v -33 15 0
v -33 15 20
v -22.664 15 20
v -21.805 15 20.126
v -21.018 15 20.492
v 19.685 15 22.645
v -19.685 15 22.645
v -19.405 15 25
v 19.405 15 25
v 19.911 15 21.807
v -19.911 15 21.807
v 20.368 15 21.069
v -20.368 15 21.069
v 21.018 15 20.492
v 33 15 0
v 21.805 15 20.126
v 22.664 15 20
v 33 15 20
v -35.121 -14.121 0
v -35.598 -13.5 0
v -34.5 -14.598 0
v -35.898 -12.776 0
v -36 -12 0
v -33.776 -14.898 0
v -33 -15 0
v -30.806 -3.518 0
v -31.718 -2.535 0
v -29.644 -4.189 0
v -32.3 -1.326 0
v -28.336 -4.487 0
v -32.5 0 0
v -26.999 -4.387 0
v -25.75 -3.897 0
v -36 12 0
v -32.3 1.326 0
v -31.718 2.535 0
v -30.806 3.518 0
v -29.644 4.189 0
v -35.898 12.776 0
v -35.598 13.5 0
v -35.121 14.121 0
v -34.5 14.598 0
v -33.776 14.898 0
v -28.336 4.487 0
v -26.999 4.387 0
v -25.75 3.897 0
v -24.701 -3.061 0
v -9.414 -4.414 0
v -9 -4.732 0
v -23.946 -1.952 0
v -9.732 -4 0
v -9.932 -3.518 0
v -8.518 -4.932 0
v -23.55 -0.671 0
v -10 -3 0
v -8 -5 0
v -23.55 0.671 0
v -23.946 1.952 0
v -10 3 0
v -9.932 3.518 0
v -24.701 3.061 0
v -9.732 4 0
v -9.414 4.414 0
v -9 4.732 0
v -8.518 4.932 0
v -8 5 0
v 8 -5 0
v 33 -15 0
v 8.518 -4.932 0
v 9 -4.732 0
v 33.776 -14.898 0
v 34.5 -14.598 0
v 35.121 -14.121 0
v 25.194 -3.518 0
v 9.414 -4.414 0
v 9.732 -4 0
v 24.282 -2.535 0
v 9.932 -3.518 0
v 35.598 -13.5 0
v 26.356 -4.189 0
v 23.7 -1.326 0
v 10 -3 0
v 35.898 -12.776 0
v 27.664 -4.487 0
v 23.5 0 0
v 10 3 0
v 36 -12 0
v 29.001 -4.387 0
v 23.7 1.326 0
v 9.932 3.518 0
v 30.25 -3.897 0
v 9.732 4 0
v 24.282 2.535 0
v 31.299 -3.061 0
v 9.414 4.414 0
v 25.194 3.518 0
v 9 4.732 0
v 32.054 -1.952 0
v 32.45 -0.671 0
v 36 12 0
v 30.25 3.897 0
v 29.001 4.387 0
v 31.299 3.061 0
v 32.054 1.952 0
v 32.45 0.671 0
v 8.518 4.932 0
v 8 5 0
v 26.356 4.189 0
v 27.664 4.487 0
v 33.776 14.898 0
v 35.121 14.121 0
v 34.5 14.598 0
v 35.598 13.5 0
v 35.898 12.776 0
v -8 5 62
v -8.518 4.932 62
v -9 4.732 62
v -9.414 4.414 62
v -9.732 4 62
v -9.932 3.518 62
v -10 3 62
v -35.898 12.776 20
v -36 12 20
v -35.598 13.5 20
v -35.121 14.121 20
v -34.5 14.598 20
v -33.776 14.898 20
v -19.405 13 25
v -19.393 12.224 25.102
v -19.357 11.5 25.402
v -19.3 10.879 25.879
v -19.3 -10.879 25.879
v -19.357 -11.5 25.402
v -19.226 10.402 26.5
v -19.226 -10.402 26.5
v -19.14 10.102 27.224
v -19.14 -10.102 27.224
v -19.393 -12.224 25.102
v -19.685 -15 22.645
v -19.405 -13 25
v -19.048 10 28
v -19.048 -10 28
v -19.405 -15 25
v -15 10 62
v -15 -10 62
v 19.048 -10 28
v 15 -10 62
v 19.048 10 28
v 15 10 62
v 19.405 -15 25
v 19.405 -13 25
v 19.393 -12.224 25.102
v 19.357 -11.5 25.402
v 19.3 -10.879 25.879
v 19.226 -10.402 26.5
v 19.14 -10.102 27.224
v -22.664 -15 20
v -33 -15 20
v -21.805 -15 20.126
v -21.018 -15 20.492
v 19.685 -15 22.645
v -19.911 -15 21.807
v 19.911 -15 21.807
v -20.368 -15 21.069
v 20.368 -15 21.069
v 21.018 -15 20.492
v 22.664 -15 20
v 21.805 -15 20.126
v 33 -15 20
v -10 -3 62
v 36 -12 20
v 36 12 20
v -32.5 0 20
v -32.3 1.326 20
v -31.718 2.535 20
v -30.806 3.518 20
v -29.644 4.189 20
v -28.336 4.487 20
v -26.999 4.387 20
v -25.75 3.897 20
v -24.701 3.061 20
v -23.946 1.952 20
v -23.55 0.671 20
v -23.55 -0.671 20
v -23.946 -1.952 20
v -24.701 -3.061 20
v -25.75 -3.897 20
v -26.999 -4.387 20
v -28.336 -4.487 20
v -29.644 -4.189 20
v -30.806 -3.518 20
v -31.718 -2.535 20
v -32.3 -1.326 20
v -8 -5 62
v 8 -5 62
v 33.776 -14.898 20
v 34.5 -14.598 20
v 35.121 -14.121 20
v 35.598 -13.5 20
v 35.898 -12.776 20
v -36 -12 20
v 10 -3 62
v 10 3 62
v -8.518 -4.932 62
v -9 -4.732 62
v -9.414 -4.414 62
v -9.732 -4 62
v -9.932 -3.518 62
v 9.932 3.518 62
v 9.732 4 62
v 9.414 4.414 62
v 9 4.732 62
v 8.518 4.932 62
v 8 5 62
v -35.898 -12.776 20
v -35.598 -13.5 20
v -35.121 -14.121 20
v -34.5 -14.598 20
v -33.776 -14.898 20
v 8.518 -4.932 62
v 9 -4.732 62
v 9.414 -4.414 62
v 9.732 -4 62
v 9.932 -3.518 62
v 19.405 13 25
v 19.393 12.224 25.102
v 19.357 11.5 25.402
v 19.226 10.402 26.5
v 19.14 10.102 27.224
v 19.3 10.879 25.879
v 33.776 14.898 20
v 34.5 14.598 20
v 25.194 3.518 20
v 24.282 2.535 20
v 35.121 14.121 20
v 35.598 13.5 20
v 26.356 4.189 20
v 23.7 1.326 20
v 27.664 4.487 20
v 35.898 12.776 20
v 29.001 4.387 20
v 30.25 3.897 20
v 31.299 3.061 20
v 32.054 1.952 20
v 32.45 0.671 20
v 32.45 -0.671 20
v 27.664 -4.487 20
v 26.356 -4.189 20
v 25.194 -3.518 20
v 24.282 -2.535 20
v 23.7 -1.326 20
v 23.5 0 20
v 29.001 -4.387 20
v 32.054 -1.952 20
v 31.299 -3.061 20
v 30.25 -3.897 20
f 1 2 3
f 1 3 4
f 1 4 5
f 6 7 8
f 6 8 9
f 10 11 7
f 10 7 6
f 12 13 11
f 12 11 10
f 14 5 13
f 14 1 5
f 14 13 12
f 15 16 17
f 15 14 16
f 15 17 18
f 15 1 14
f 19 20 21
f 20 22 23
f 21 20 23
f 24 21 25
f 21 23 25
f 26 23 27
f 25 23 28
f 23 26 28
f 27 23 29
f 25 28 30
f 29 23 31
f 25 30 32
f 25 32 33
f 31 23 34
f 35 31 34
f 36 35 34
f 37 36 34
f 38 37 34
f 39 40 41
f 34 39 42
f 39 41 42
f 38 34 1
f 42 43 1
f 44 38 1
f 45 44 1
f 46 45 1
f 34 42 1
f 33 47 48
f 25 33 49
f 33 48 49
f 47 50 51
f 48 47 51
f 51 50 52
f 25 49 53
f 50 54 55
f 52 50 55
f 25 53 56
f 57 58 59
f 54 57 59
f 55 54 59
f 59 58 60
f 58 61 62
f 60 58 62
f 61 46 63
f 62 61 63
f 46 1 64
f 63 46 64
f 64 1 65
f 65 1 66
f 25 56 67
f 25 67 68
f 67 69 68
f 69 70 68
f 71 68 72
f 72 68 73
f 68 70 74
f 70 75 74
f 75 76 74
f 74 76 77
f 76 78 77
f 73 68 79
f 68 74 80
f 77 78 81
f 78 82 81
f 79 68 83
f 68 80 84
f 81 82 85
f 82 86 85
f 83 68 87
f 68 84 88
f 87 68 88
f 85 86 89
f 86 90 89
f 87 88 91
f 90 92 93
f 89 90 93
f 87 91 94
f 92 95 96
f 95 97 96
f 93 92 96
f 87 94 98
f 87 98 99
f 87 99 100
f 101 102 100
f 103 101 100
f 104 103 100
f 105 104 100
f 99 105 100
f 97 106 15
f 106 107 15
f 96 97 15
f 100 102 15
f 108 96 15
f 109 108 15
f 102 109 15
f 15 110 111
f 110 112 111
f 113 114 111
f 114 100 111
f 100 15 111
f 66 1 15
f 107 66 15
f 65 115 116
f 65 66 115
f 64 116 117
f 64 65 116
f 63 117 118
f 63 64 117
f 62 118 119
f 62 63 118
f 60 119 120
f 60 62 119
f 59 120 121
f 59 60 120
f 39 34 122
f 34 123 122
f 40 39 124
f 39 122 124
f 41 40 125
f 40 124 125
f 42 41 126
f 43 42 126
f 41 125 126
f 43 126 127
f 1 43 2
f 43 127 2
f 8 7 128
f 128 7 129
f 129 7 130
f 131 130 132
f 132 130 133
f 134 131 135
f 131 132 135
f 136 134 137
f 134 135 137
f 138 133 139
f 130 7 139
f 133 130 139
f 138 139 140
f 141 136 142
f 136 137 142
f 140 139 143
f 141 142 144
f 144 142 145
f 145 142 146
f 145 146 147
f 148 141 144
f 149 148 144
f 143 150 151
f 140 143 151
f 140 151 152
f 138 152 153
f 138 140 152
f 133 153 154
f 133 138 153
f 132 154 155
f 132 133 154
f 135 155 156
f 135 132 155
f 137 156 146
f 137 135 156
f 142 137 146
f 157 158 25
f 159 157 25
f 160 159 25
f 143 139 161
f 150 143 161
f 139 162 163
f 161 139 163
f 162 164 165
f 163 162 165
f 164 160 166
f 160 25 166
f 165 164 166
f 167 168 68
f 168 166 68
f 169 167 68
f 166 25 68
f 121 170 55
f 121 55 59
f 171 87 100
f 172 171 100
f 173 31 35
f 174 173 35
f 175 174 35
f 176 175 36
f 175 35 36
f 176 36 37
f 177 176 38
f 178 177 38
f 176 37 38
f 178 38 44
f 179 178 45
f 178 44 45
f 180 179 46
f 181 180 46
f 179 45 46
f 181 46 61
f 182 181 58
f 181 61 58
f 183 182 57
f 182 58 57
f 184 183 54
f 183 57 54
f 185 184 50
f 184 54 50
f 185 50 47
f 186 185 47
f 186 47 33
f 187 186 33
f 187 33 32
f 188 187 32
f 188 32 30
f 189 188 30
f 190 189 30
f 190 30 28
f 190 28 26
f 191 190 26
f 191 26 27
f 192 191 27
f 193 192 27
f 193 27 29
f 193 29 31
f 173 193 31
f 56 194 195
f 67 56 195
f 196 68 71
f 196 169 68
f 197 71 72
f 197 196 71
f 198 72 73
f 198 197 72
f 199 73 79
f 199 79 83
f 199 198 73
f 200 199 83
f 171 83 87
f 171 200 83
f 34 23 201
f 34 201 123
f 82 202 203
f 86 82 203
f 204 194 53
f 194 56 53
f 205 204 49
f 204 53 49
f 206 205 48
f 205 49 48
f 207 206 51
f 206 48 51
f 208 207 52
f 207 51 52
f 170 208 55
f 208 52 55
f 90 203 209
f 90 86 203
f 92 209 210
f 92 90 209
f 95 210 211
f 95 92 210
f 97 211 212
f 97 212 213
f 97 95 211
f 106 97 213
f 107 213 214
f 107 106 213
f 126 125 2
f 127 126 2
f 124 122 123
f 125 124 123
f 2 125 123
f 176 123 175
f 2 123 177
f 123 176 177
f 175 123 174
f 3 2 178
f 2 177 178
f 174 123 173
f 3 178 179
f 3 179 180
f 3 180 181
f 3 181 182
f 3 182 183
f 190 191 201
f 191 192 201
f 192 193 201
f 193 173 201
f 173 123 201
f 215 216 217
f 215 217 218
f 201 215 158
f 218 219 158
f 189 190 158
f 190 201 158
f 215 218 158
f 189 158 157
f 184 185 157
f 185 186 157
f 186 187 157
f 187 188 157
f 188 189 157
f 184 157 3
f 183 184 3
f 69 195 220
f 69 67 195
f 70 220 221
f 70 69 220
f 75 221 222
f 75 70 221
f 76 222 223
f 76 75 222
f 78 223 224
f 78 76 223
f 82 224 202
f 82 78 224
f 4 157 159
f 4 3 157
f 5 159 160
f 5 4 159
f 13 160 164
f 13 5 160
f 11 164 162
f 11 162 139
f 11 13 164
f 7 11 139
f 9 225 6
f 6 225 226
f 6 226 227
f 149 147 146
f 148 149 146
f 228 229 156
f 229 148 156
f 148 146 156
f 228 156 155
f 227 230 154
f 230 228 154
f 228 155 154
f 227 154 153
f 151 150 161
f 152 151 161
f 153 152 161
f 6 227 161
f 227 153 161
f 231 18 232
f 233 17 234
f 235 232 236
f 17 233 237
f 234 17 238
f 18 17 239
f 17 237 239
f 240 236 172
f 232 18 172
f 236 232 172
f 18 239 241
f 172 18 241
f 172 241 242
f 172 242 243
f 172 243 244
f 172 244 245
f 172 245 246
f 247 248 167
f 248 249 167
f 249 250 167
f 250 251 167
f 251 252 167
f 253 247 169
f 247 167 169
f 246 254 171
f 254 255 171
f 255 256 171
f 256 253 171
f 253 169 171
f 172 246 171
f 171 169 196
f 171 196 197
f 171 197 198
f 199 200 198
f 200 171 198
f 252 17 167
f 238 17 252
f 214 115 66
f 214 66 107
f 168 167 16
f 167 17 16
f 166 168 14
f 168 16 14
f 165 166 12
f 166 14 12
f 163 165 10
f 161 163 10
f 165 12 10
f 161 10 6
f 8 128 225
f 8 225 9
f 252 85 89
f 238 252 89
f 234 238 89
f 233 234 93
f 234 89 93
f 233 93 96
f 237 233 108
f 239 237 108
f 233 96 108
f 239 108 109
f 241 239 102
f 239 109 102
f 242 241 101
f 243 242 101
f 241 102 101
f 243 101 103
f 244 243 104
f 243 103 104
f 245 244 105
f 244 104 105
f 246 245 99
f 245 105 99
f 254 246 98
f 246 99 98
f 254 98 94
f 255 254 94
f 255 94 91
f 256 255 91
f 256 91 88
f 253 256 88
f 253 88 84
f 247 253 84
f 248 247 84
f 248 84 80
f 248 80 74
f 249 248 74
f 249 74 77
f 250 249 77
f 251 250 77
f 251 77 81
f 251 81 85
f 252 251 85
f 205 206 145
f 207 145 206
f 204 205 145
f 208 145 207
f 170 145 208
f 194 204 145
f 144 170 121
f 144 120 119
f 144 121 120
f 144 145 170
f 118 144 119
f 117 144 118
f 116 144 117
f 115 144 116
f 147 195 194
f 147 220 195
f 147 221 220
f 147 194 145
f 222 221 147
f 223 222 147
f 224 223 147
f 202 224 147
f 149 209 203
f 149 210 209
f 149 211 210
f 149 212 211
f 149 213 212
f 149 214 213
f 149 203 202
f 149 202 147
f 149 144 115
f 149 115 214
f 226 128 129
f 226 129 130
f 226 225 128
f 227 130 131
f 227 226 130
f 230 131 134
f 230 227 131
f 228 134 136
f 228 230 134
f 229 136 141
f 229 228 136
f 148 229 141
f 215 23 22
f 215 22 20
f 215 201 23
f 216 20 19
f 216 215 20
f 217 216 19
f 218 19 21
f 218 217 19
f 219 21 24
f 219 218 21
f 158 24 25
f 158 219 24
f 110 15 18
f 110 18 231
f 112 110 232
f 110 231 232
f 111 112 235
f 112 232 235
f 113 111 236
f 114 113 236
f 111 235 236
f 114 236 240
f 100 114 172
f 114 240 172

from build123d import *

# Parameters (mm, degrees)
F0_W          = 72
F0_H          = 30
F1_DEPTH      = 62
F3_DEPTH      = 30.001
F4_W          = 15
F4_H          = 47
F5_DEPTH      = 36.001
F5_DEPTH_BACK = 25
F6_W          = 20
F6_H          = 10
F7_DEPTH      = 62.001
F9_D          = 9
F10_R         = 3
F11_R         = 3
F12_R         = 3
F13_R         = 2


with BuildPart() as f1:
    # F0 (on Top) → F1 (new body)
    with BuildSketch(Plane.XY):
        Rectangle(F0_W, F0_H)
    extrude(amount=F1_DEPTH)

    # F2 (on face) → F3 (cut, through all)
    with BuildSketch(Plane.XZ.offset(15)):
        Polygon((-15, 72), (-46, 72), (-46, 20), (-20, 20), (-15, 62), align=None)
        Polygon((46, 72), (15, 72), (15, 62), (20, 20), (46, 20), align=None)
    extrude(amount=-F3_DEPTH, mode=Mode.SUBTRACT)

    # F4 (on Right) → F5 (cut, two sides)
    with BuildSketch(Plane.YZ) as f5_sk:
        with Locations((-17.5, 48.5)):
            Rectangle(F4_W, F4_H)
        with Locations((17.5, 48.5)):
            Rectangle(F4_W, F4_H)
    extrude(amount=-F5_DEPTH, mode=Mode.SUBTRACT)
    extrude(f5_sk.sketch, amount=F5_DEPTH_BACK, mode=Mode.SUBTRACT)

    # F6 (on face) → F7 (cut, through all)
    with BuildSketch(Plane.XY.offset(62)):
        Rectangle(F6_W, F6_H)
    extrude(amount=-F7_DEPTH, mode=Mode.SUBTRACT)

    # F9 (through all)
    with Locations(Plane.XY.offset(20)):
        with Locations((-28, 0), (28, 0)):
            Hole(F9_D / 2)

    # F10
    f10_edges = [f1.edges().sort_by_distance(p)[0] for p in [
        (-36, 15, 10),
        (36, -15, 10),
        (36, 15, 10),
        (-36, -15, 10),
    ]]
    fillet(f10_edges, radius=F10_R)

    # F11
    f11_edges = [f1.edges().sort_by_distance(p)[0] for p in [
        (-20, 0, 20),
        (20, 0, 20),
    ]]
    fillet(f11_edges, radius=F11_R)

    # F12
    f12_edges = [f1.edges().sort_by_distance(p)[0] for p in [
        (0, 10, 25),
        (0, -10, 25),
    ]]
    fillet(f12_edges, radius=F12_R)

    # F13
    f13_edges = [f1.edges().sort_by_distance(p)[0] for p in [
        (10, 5, 31),
        (10, -5, 31),
        (-10, -5, 31),
        (-10, 5, 31),
    ]]
    fillet(f13_edges, radius=F13_R)


solid = f1.part
